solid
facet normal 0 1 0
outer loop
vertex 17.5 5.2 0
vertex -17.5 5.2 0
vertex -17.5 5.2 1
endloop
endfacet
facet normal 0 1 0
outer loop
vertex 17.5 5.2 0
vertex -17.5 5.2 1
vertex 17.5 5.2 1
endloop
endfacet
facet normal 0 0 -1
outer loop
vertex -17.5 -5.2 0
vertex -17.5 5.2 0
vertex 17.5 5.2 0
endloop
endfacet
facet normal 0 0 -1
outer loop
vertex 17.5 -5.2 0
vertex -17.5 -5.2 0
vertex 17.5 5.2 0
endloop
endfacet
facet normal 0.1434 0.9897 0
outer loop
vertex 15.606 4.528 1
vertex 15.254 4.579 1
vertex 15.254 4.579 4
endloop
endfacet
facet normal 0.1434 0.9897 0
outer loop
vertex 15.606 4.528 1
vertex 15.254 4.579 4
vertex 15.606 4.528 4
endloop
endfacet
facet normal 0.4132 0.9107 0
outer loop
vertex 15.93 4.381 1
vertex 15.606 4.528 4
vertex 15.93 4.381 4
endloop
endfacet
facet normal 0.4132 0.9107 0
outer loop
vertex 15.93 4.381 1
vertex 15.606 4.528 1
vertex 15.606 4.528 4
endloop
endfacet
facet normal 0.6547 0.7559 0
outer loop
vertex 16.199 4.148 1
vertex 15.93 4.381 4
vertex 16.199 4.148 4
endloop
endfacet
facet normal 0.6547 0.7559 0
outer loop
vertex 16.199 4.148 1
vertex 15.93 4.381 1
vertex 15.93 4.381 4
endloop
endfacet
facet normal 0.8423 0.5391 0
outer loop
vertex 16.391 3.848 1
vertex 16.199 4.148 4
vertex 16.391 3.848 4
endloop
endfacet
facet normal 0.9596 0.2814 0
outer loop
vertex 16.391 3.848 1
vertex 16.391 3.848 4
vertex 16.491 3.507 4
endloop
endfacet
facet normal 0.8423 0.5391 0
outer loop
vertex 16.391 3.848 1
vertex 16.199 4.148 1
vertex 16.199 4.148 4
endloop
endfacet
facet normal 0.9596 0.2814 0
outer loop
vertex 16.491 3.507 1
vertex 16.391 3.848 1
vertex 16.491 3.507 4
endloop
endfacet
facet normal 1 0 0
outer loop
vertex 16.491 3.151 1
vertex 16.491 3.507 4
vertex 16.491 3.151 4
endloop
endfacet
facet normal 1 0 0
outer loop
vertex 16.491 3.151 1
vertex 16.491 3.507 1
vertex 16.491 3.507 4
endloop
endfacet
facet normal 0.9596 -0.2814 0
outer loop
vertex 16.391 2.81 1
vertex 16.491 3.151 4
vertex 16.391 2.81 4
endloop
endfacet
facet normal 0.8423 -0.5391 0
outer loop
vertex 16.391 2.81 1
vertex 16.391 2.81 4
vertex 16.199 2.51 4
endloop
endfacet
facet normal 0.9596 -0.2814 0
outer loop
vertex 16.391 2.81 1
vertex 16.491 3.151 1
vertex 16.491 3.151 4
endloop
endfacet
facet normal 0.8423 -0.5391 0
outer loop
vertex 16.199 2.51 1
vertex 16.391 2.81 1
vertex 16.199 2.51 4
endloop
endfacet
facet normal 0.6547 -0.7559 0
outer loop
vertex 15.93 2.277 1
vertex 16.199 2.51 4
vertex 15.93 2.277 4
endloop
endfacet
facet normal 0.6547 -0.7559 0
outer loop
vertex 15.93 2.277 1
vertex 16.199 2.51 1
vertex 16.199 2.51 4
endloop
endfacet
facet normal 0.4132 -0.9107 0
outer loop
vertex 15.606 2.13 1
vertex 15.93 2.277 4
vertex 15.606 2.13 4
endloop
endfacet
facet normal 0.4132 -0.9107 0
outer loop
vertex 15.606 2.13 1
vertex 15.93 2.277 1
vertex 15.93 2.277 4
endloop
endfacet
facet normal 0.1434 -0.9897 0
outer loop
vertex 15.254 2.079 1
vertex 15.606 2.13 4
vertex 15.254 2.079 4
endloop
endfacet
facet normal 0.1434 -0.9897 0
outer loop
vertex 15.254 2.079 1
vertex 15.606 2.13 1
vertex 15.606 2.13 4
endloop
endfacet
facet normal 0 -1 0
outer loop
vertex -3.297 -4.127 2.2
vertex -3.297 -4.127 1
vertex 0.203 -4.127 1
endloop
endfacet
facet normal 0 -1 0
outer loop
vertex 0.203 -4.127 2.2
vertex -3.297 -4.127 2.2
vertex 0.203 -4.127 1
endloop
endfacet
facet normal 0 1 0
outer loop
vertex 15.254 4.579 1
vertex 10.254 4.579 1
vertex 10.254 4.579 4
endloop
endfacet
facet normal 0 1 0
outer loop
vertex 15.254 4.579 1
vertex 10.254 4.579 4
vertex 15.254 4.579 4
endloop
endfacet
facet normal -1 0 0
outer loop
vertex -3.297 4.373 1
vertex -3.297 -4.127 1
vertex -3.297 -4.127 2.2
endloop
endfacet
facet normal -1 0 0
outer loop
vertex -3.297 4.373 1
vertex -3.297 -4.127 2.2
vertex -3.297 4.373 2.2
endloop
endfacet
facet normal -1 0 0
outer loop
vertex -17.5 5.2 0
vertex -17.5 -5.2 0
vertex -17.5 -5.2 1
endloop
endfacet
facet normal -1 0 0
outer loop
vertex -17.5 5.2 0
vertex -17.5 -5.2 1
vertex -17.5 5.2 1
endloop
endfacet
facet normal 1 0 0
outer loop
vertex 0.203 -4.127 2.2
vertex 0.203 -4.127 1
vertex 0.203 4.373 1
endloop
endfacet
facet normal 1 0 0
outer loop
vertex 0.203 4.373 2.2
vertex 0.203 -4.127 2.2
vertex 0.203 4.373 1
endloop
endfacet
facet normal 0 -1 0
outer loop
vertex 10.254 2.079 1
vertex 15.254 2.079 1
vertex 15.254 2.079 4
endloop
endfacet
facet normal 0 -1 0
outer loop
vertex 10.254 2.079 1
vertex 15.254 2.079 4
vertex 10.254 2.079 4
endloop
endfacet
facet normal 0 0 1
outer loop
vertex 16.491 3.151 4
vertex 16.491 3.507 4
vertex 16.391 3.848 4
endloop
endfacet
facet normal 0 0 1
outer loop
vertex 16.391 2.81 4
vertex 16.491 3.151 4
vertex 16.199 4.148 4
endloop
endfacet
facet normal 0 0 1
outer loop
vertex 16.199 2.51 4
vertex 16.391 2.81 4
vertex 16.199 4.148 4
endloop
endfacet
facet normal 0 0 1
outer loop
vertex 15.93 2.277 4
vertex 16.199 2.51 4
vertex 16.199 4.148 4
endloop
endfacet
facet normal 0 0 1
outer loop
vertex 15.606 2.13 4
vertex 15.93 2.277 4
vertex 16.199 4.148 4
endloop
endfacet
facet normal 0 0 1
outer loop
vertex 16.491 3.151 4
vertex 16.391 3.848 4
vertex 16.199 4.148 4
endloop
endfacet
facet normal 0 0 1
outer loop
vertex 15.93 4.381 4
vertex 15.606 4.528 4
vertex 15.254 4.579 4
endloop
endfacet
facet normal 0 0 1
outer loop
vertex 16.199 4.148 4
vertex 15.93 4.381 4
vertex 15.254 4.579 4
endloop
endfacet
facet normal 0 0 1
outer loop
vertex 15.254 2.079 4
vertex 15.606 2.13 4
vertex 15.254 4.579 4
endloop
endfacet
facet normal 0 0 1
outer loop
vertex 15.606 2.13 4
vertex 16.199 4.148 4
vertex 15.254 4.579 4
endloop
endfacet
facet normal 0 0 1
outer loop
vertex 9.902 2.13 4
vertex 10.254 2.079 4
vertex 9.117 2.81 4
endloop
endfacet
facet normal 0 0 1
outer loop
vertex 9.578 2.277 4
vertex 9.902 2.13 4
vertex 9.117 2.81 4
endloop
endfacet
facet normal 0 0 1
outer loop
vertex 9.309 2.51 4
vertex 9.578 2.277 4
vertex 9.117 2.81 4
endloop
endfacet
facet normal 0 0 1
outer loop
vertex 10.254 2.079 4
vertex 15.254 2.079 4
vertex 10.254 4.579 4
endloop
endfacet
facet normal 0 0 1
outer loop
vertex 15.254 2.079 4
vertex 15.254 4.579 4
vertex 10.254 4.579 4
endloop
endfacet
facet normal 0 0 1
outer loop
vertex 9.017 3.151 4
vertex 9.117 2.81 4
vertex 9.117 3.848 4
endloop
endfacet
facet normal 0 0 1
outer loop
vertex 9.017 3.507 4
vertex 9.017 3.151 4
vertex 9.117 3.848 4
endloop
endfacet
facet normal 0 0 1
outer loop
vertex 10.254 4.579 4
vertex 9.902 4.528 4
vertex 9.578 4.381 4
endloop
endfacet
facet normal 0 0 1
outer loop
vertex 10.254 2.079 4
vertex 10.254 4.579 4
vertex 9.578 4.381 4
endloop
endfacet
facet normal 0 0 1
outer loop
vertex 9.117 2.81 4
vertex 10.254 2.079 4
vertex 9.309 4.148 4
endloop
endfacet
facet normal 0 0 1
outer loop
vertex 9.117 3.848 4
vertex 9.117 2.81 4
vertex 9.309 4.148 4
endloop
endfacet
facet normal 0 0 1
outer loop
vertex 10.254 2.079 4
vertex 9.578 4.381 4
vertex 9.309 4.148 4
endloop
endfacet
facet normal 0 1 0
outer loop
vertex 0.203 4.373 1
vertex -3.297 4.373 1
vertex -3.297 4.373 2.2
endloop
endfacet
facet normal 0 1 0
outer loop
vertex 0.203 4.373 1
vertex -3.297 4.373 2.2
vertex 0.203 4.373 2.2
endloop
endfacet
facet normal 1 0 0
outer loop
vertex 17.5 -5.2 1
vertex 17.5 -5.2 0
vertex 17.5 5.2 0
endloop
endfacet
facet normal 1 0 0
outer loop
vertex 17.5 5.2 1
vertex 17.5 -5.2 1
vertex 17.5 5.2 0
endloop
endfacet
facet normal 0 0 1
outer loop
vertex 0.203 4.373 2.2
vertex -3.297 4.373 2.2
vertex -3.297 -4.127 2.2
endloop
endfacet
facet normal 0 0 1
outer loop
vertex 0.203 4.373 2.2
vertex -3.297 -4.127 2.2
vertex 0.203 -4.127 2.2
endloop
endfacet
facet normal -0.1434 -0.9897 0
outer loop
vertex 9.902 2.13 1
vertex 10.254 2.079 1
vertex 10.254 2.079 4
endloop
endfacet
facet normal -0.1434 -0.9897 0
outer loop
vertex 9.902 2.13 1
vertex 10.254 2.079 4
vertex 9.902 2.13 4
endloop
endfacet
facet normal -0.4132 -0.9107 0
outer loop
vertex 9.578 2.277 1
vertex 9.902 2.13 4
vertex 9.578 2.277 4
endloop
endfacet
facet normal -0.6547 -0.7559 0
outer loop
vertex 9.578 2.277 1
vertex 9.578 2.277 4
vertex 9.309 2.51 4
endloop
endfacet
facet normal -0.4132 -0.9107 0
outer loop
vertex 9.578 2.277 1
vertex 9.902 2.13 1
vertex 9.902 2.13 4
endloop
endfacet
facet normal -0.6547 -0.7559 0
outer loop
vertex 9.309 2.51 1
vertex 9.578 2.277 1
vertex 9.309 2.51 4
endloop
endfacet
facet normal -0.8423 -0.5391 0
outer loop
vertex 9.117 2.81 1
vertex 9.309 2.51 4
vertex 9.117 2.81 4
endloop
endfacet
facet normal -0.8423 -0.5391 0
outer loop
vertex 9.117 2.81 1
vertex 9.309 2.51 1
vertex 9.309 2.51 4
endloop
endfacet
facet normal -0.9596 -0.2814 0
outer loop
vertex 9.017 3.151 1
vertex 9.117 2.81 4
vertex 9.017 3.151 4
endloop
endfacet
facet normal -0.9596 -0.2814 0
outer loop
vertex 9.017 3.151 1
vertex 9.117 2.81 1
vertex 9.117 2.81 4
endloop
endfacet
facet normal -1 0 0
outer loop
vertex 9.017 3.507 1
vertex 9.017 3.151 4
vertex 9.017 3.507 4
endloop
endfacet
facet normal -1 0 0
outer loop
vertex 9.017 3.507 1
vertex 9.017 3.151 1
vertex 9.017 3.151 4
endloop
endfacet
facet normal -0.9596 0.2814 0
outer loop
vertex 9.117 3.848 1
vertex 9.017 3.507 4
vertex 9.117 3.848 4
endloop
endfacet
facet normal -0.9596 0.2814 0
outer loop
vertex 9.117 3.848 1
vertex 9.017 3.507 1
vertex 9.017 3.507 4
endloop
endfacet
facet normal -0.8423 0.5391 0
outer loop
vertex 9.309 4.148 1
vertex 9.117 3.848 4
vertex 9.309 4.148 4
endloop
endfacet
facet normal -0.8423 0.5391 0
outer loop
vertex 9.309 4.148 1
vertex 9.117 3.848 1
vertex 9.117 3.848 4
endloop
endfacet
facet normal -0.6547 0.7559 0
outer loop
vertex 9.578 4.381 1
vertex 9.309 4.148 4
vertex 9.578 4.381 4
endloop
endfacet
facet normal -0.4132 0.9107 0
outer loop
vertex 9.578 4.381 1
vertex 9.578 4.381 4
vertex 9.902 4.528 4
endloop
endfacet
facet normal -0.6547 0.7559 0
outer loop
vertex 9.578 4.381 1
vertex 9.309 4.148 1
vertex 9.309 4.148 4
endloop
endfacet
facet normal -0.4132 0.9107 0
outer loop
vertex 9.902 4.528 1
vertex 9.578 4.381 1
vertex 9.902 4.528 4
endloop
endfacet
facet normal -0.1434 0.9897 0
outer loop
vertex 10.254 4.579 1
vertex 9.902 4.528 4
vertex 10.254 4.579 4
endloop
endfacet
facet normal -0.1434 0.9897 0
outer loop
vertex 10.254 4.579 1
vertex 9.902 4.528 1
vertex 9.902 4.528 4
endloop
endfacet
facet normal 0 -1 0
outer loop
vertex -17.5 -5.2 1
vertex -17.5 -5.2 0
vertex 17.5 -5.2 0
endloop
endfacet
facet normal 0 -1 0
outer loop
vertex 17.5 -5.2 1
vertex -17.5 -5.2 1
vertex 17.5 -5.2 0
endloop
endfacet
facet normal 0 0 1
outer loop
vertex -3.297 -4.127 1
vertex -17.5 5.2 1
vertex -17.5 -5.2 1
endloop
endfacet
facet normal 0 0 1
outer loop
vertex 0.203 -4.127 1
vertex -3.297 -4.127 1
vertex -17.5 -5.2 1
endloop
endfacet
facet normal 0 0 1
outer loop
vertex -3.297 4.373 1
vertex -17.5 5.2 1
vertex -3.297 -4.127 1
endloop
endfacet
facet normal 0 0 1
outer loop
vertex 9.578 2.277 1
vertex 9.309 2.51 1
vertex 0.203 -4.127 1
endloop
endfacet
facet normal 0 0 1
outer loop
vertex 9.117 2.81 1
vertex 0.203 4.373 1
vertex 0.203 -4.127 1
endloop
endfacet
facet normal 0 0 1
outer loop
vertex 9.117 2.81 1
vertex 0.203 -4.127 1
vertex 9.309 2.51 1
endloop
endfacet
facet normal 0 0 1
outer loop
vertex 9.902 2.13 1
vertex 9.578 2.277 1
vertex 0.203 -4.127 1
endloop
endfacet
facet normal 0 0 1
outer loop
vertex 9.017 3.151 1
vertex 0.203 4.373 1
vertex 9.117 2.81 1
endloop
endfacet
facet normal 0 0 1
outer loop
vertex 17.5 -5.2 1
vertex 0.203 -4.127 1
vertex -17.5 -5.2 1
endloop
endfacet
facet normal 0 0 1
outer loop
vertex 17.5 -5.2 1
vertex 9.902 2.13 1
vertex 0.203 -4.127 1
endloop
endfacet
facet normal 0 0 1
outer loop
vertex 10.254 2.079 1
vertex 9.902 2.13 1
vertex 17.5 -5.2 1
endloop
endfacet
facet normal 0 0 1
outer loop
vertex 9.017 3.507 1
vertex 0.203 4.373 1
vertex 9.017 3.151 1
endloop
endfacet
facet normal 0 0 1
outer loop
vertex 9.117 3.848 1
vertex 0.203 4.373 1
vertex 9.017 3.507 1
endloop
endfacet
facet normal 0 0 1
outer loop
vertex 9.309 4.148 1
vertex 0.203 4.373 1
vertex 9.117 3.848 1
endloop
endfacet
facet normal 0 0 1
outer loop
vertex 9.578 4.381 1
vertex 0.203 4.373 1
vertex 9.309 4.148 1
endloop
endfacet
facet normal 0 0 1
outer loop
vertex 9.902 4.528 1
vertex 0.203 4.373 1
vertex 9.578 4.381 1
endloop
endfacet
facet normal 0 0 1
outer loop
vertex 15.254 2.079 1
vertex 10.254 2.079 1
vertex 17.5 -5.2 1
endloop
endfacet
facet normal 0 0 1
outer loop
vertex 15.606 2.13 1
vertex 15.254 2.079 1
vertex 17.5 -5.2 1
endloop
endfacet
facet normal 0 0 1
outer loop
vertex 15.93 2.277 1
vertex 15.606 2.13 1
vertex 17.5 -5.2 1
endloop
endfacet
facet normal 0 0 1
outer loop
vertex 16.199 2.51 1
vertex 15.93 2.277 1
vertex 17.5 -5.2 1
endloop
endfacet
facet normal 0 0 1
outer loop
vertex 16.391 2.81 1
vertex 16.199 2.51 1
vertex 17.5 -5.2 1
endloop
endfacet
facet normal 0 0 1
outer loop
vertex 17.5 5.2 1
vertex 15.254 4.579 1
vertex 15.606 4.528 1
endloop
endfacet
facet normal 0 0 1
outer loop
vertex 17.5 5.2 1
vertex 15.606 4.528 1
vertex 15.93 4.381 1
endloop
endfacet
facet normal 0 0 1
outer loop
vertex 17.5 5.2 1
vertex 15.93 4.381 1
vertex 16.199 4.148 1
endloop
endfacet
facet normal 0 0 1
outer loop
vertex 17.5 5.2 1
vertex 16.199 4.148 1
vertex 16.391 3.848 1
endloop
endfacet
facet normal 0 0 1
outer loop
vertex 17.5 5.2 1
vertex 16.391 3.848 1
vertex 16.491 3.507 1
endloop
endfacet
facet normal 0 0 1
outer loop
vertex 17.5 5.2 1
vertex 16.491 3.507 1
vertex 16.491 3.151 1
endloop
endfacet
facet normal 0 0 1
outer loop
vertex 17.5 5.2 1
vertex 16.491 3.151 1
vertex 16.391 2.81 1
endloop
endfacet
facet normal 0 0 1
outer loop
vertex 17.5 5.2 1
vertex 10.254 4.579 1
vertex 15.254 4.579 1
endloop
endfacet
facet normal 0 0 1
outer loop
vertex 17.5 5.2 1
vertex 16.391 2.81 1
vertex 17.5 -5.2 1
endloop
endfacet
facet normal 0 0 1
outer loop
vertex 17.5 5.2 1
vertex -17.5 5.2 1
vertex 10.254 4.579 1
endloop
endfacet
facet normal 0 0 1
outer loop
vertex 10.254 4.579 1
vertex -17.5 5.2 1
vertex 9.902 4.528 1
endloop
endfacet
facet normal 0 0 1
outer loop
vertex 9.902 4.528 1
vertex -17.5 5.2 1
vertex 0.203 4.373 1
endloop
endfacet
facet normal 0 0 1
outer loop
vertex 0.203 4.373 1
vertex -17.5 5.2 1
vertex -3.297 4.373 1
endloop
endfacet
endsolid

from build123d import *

# Parameters (mm, degrees)
SKETCH1_W           = 35
SKETCH1_H           = 10.4
BOSS_EXTRUDE1_DEPTH = 1
BOSS_EXTRUDE3_DEPTH = 3
SKETCH3_W           = 3.5
SKETCH3_H           = 8.5
BOSS_EXTRUDE4_DEPTH = 1.2


with BuildPart() as part:
    # Sketch1 → Boss-Extrude1 (new body)
    with BuildSketch(Plane.XY):
        Rectangle(SKETCH1_W, SKETCH1_H)
    extrude(amount=BOSS_EXTRUDE1_DEPTH)

    # Sketch2 → Boss-Extrude3 (add)
    with BuildSketch(Plane.XY.offset(1)):
        with BuildLine():
            Line((15.253902663, 2.079032558), (10.253902663, 2.079032558))
            ThreePointArc((10.253902663, 2.079032558), (9.003902663, 3.329032558), (10.253902663, 4.579032558))
            Line((10.253902663, 4.579032558), (15.253902663, 4.579032558))
            ThreePointArc((15.253902663, 4.579032558), (16.503902663, 3.329032558), (15.253902663, 2.079032558))
        make_face()
    extrude(amount=BOSS_EXTRUDE3_DEPTH)

    # Sketch3 → Boss-Extrude4 (add)
    with BuildSketch(Plane.XY.offset(1)):
        with Locations((-1.547221583, 0.122630604)):
            Rectangle(SKETCH3_W, SKETCH3_H)
    extrude(amount=BOSS_EXTRUDE4_DEPTH)


solid = part.part
